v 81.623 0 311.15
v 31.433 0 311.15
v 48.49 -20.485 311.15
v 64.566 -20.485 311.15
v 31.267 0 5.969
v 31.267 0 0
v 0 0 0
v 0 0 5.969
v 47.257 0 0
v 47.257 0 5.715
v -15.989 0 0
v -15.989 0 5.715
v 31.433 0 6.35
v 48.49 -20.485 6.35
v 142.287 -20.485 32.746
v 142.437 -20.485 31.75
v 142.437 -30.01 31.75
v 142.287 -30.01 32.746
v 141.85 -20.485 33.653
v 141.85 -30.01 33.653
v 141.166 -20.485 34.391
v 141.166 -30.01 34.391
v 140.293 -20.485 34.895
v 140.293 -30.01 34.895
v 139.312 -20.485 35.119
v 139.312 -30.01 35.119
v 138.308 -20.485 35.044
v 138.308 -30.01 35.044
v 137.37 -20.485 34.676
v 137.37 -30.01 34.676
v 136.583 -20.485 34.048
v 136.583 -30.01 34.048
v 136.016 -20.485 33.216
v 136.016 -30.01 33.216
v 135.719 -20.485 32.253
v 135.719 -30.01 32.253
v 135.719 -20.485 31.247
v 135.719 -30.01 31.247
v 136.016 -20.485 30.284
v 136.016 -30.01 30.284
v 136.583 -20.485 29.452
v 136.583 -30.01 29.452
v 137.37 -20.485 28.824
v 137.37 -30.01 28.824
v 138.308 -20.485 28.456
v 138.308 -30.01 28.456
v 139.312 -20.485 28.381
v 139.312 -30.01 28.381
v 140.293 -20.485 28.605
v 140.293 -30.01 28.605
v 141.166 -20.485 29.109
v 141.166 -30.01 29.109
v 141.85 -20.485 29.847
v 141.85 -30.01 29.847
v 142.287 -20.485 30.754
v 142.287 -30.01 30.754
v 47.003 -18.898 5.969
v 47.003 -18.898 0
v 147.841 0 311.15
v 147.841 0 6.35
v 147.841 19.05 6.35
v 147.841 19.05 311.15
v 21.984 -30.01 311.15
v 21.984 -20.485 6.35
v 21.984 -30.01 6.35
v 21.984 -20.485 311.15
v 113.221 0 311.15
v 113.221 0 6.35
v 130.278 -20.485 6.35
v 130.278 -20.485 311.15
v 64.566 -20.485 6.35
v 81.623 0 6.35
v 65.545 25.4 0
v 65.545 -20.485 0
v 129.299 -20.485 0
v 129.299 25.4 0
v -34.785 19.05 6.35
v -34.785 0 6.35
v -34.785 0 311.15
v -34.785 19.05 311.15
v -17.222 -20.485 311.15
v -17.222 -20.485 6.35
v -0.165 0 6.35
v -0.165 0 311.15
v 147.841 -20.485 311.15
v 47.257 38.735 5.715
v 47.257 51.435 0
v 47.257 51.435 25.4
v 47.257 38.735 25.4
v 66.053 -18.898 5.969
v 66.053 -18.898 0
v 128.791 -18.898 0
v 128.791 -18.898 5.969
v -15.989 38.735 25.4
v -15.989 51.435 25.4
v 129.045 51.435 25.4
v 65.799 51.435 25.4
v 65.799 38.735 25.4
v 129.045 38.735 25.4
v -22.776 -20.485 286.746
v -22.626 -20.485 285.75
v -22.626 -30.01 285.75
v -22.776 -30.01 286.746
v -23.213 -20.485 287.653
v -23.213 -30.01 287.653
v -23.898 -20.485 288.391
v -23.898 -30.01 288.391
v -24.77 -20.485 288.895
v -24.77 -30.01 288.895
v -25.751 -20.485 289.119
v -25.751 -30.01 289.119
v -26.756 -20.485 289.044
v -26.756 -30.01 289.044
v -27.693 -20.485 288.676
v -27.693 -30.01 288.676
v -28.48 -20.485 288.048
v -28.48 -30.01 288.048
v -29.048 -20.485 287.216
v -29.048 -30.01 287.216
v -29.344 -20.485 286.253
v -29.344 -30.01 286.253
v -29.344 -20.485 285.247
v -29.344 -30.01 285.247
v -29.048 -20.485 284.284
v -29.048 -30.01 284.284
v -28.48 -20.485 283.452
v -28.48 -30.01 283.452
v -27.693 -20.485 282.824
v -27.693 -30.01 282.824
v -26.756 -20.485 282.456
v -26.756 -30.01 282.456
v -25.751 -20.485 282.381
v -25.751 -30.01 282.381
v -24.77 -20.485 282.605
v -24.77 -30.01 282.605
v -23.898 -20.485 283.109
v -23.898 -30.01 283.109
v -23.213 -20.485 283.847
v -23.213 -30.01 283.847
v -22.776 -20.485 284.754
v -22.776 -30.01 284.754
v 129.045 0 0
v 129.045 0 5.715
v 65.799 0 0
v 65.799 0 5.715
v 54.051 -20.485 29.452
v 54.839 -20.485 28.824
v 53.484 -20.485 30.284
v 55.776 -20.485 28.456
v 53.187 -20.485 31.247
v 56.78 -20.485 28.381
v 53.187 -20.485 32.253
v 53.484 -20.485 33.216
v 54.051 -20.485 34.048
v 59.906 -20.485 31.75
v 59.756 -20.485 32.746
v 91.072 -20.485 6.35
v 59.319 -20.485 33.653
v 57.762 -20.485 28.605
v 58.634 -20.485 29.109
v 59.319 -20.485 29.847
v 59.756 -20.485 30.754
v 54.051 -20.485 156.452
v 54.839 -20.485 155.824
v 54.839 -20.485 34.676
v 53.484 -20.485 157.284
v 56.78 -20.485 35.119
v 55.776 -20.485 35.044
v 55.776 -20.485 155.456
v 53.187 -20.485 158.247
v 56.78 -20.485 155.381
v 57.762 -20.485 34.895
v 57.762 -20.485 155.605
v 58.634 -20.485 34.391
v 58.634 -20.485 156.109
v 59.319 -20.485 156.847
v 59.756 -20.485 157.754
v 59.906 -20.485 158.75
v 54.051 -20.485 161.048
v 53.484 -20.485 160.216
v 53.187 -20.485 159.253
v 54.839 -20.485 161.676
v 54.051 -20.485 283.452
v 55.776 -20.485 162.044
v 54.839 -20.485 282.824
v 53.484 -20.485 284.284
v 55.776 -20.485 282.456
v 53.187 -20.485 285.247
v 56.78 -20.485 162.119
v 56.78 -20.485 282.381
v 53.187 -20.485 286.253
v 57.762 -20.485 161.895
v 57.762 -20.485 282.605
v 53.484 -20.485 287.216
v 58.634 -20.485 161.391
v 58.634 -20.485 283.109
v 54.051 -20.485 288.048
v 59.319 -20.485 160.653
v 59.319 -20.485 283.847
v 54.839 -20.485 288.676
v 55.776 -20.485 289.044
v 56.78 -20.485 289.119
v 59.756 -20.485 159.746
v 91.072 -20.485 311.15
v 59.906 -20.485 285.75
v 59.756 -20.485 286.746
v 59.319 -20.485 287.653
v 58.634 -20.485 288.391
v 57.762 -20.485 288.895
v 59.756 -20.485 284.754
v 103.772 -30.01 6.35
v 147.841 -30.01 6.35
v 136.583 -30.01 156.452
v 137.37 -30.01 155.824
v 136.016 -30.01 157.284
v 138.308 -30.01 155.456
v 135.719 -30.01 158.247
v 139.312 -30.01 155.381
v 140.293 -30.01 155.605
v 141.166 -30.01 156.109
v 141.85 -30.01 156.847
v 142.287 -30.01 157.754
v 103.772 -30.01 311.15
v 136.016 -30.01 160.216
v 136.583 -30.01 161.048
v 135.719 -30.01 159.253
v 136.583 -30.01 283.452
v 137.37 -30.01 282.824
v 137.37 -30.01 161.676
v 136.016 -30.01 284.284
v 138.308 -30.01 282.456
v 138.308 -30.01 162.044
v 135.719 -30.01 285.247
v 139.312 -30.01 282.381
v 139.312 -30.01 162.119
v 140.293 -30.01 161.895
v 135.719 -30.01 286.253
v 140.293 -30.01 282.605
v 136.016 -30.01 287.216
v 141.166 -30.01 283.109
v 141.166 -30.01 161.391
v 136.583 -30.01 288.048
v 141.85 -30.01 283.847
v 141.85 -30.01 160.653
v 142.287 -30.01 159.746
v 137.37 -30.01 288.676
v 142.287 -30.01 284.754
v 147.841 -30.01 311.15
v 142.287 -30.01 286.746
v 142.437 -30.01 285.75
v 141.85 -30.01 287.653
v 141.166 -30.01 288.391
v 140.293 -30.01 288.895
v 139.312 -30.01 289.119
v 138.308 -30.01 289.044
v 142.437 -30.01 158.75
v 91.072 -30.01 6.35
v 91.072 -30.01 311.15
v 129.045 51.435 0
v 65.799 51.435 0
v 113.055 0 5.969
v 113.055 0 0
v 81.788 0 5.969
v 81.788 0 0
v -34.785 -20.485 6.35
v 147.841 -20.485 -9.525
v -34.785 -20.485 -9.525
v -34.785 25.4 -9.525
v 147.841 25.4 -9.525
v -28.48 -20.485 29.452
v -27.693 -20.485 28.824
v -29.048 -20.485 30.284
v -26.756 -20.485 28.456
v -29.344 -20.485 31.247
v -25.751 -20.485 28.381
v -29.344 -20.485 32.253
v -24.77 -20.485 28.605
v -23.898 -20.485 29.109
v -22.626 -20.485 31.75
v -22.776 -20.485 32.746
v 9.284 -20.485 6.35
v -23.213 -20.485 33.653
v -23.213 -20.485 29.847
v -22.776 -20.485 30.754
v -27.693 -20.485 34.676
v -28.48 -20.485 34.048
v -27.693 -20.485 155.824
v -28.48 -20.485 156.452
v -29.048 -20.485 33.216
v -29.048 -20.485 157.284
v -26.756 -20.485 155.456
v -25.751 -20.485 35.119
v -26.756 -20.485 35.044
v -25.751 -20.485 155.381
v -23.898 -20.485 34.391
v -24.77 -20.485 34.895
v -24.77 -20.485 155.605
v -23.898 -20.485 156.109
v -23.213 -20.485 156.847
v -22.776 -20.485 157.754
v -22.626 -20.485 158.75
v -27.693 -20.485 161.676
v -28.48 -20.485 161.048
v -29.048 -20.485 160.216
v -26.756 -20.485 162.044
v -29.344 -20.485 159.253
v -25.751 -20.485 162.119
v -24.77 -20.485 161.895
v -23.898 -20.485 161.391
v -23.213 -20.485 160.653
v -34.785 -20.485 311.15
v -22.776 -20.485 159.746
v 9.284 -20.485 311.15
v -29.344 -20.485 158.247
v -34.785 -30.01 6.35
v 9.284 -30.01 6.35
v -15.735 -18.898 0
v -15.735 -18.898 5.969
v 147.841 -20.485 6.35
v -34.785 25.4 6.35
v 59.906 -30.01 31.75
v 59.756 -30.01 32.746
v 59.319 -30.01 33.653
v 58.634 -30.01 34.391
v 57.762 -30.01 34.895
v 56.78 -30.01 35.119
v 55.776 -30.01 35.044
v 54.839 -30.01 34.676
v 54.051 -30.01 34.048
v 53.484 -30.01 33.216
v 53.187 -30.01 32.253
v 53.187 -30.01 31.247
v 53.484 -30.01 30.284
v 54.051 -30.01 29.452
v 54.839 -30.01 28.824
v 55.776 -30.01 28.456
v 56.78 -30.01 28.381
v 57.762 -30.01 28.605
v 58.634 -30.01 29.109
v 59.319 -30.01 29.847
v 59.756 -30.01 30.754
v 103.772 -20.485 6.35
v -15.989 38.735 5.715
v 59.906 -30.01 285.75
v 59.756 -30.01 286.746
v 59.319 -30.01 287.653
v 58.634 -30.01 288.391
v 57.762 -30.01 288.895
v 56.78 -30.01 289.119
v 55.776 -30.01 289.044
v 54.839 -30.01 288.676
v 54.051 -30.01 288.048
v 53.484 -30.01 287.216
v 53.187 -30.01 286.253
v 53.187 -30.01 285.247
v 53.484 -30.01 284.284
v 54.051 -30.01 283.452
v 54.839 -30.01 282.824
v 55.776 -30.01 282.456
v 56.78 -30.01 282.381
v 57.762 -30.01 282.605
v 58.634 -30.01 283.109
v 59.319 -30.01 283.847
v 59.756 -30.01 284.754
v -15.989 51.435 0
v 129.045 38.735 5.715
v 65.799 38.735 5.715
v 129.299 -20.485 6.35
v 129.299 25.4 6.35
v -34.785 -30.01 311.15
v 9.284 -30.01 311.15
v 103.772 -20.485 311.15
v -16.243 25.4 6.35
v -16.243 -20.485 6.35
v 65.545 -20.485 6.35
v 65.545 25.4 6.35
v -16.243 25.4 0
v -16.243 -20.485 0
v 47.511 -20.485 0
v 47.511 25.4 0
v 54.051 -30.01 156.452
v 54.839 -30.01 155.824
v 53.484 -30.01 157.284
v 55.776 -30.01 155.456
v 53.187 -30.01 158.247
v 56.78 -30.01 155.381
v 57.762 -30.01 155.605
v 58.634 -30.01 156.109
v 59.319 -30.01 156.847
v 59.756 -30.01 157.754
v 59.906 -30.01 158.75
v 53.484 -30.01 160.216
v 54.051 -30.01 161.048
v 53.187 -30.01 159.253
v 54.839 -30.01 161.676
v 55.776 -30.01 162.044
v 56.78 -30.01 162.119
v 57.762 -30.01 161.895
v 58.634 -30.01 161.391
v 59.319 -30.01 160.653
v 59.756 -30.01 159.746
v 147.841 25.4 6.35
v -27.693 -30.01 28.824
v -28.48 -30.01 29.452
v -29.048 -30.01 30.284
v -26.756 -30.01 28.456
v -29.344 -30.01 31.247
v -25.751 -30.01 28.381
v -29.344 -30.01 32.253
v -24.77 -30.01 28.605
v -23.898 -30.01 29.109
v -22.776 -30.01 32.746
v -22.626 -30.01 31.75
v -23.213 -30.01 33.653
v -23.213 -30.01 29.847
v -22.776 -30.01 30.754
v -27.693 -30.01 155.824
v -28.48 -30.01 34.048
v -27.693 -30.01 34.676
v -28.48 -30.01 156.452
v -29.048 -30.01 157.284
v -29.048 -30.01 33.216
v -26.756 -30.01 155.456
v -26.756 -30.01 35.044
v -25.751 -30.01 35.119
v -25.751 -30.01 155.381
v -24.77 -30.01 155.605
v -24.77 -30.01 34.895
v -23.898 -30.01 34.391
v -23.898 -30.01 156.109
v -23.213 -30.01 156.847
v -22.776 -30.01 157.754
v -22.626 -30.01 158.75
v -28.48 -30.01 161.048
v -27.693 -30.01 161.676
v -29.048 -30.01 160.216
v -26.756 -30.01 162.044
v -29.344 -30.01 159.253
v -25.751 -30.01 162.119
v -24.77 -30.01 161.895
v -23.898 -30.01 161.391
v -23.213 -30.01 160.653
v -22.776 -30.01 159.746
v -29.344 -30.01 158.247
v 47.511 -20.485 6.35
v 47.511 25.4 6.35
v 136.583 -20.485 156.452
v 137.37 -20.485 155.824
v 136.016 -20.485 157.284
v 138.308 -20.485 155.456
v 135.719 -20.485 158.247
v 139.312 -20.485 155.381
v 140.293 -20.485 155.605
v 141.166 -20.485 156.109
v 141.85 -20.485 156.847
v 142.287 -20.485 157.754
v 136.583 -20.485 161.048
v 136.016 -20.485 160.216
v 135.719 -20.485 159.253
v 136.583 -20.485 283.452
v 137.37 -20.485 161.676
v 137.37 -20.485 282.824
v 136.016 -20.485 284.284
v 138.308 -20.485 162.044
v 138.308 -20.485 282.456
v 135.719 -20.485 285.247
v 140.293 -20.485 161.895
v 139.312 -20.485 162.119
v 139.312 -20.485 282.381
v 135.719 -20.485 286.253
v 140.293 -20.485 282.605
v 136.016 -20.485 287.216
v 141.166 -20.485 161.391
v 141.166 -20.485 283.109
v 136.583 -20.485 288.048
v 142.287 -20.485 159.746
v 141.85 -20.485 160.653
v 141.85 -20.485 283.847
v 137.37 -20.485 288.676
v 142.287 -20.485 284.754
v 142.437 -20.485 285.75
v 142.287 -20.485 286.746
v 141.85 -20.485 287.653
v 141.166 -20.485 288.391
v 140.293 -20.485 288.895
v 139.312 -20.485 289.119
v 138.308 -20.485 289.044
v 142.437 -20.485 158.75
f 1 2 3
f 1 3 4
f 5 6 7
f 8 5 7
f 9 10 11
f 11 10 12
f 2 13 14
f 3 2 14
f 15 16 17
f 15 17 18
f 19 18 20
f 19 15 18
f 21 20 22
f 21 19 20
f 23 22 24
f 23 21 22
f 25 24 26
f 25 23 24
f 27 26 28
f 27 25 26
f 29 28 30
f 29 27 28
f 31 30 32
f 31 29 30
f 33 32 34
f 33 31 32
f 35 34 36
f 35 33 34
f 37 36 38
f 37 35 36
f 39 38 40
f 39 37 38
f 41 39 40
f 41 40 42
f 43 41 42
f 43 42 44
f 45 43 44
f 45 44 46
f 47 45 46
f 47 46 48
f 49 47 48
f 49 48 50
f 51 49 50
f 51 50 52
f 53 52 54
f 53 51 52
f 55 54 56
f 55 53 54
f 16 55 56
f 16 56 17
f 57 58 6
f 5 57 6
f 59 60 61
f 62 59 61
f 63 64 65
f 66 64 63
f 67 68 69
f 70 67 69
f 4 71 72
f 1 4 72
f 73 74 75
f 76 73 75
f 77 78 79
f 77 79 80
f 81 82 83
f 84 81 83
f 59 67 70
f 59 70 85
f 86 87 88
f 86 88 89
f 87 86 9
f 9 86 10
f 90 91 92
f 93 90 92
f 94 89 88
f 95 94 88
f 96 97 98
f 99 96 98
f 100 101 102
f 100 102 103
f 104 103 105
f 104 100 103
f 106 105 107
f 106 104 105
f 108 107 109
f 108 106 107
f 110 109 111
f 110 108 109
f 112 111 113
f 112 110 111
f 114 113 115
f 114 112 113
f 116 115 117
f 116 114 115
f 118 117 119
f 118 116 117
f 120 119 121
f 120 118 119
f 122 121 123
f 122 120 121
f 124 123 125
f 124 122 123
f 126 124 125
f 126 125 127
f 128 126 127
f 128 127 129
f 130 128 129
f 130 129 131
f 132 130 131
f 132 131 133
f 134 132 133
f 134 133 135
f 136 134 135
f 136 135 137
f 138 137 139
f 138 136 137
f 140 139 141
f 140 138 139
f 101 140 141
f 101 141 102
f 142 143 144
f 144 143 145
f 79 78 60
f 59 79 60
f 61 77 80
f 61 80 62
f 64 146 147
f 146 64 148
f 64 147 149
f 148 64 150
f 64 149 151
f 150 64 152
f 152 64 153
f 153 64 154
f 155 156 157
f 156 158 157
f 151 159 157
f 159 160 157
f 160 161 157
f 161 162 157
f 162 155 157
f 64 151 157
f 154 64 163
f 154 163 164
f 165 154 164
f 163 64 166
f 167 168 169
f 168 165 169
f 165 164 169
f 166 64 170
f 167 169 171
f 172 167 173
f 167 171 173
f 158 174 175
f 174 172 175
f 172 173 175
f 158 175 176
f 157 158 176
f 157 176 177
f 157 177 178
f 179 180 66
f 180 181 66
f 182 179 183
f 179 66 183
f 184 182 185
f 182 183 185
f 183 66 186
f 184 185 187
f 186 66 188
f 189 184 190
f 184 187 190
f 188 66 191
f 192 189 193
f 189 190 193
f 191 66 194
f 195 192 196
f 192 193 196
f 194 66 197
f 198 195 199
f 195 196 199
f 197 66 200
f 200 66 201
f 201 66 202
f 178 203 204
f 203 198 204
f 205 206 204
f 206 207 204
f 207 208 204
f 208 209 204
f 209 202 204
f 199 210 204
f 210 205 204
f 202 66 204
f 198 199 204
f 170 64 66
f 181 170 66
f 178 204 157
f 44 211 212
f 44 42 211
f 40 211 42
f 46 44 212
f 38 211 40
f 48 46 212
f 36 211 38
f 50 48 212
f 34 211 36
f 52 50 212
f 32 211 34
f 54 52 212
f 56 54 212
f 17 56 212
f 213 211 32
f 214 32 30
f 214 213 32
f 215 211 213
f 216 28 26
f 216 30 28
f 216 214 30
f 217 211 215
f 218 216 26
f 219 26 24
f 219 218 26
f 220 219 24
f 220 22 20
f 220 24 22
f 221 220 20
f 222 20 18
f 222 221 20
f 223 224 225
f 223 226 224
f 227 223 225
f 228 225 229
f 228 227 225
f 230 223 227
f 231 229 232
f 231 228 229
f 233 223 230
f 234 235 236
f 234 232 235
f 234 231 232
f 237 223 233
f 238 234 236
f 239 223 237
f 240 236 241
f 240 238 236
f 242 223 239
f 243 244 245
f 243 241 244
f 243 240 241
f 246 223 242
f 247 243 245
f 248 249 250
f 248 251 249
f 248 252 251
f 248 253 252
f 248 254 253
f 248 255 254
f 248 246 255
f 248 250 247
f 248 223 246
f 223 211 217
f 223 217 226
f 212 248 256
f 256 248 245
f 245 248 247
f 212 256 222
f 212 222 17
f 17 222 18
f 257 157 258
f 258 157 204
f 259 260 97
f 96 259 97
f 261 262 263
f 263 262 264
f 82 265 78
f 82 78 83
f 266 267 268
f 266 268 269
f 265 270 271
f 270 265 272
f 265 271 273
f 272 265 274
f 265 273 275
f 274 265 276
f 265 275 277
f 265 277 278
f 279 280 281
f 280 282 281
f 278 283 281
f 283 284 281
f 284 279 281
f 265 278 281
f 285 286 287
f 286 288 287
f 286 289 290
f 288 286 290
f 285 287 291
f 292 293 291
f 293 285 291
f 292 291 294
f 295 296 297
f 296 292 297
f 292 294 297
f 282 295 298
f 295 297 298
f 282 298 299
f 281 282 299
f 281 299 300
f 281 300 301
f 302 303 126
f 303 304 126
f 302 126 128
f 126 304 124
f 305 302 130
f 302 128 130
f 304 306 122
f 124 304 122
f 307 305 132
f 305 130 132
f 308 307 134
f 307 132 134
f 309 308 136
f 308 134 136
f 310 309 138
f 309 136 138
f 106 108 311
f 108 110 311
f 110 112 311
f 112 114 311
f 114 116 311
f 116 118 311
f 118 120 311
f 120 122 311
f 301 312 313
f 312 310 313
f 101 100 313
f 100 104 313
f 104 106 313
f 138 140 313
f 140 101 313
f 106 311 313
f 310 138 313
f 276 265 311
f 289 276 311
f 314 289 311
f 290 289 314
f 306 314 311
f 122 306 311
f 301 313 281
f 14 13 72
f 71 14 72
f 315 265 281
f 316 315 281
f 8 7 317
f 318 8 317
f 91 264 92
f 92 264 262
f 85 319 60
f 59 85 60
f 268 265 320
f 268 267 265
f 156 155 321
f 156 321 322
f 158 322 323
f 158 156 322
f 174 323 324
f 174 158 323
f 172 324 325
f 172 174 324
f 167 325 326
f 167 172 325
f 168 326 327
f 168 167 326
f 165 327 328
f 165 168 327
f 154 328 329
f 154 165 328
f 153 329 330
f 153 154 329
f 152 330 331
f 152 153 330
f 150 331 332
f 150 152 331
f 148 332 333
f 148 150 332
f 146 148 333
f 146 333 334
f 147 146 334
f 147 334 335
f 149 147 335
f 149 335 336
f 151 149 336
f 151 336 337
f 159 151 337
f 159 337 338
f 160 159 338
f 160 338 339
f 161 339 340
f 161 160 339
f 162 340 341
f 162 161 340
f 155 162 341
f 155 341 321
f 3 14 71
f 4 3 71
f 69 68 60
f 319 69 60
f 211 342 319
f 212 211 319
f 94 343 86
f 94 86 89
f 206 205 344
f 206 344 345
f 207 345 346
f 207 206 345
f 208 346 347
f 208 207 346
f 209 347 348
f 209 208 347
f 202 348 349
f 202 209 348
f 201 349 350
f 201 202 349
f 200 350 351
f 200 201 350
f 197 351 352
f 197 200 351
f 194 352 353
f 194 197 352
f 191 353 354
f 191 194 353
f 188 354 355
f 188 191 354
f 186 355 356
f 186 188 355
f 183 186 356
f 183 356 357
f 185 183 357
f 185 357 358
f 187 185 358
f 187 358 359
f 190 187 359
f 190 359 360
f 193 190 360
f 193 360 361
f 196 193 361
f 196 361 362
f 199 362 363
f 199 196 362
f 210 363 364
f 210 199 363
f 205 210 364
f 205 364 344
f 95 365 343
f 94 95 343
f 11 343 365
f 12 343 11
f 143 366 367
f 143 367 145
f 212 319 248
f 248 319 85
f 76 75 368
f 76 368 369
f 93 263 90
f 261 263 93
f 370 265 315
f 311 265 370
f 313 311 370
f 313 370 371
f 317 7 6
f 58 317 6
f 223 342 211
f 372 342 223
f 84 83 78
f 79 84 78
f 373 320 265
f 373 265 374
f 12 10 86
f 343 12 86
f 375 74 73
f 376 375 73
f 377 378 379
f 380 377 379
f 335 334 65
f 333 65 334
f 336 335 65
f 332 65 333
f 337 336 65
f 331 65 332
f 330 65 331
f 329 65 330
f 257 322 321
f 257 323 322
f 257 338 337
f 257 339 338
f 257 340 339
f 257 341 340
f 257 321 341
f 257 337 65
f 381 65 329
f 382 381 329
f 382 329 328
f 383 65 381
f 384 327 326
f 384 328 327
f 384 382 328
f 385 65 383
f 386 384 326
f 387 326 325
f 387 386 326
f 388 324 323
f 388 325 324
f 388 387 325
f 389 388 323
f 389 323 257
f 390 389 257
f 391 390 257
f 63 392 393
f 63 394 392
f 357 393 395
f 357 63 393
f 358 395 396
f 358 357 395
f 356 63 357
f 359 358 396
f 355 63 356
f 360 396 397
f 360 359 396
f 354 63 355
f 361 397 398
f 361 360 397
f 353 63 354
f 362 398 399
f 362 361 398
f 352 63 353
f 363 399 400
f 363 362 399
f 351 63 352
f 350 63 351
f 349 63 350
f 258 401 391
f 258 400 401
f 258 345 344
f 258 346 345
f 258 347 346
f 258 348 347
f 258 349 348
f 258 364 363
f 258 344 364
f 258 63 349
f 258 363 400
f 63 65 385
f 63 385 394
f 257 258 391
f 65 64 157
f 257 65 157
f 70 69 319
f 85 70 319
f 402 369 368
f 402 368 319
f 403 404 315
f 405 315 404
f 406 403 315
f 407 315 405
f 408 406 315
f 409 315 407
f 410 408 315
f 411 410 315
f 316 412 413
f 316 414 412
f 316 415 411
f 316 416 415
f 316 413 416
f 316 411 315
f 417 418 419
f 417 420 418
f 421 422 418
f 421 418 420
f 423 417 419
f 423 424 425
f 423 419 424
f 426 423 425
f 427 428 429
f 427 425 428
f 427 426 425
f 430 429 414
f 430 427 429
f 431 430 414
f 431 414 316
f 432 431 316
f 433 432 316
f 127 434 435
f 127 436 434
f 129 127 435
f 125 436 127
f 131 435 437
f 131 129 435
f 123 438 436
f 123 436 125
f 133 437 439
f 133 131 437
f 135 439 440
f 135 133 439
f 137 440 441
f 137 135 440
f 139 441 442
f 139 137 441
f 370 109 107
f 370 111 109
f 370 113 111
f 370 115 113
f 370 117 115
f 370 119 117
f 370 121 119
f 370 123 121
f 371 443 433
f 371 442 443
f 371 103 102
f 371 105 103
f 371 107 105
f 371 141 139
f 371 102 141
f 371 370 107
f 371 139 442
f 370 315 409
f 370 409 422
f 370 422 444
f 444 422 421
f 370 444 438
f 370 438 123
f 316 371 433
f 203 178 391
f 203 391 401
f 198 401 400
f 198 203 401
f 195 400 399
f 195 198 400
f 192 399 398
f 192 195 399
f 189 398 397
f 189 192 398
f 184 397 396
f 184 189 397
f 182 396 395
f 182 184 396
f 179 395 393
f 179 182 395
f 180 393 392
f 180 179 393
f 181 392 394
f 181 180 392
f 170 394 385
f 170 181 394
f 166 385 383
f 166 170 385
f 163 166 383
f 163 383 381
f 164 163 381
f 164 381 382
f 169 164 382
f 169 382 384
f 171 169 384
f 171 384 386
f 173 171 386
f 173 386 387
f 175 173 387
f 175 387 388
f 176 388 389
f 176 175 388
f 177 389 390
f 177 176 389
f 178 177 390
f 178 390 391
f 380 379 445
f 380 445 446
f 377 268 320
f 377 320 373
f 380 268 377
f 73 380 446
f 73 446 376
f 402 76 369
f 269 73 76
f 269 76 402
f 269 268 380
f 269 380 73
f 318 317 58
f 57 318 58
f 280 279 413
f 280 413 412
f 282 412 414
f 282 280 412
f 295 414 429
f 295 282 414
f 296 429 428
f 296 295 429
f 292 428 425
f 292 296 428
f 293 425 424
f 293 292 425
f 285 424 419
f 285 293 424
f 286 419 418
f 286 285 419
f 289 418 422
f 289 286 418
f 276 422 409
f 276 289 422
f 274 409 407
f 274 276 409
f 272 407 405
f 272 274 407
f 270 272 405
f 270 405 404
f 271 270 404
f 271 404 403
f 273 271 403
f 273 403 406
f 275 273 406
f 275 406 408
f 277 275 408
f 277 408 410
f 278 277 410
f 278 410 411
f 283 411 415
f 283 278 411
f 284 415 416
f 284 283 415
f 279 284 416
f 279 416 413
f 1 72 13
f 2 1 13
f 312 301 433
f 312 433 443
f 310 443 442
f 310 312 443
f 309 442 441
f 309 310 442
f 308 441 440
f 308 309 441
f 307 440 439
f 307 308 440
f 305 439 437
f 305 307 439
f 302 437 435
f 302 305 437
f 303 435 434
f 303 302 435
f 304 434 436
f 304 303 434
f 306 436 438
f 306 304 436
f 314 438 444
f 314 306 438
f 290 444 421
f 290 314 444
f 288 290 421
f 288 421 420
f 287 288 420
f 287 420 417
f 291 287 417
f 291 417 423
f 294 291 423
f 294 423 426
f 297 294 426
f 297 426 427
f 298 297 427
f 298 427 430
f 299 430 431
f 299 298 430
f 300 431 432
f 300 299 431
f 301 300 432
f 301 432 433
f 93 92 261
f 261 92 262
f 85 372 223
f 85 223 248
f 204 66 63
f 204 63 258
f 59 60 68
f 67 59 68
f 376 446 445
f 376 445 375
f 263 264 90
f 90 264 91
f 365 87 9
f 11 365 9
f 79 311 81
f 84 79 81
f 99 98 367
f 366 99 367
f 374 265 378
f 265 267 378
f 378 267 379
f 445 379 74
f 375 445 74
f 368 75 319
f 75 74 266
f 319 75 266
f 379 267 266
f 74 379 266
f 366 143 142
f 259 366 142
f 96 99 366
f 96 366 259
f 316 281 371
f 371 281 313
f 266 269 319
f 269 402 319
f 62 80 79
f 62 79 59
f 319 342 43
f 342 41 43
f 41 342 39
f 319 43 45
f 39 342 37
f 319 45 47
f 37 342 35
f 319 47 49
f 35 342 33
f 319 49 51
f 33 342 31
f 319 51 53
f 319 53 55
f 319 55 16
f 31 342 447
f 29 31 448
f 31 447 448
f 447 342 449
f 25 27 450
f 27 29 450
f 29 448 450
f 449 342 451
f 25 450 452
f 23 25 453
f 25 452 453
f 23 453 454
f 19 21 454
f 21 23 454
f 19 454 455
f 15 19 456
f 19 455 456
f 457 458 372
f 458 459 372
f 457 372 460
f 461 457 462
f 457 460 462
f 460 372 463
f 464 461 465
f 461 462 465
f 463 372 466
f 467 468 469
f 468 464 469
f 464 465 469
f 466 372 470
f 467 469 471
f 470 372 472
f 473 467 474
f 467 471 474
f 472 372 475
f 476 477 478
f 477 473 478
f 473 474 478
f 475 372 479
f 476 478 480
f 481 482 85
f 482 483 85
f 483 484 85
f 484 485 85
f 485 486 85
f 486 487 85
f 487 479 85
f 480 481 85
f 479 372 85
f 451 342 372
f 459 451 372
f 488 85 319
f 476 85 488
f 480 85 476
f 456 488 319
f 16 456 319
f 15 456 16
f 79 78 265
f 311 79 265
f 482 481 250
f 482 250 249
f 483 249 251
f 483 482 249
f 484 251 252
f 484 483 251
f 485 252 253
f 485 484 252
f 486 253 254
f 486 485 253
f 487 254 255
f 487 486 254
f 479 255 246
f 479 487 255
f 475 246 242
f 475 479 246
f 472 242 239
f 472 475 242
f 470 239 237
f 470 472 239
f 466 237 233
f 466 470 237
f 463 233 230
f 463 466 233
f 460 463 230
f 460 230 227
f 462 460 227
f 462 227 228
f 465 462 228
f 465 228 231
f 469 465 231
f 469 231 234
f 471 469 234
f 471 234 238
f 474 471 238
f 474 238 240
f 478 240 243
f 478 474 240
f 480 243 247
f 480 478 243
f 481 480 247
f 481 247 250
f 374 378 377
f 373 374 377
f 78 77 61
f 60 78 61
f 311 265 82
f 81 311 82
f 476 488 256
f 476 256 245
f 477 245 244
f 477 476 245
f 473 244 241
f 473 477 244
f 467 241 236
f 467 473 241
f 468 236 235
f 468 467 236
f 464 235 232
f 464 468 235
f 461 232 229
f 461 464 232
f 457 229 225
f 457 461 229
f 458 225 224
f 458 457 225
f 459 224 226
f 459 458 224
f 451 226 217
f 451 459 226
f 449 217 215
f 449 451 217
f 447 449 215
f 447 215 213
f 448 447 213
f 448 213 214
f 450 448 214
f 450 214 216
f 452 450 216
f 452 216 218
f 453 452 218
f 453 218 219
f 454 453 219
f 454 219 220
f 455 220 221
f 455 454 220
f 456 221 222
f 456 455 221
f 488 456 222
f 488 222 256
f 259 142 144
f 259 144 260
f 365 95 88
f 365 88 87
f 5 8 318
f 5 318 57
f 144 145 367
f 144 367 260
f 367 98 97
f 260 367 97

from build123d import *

# Parameters (mm, degrees)
F1_DEPTH  = 5.969
F2_W      = 182.626
F2_H      = 45.8851
F3_DEPTH  = 9.525
F4_W      = 47.2567
F4_H      = 5.715
F4_W_2    = 15.9893
F5_DEPTH  = 25.4
F4_W_3    = 63.246
F6_W      = 18.542
F6_H      = 45.8851
F6_W_2    = 18.034
F7_DEPTH  = 6.35
F8_W      = 182.626
F8_H      = 19.05
F9_DEPTH  = 304.8
F11_DEPTH = 63.246
F13_DEPTH = 63.246
F15_DEPTH = 304.8
F16_W     = 44.069
F16_H     = 304.8
F16_R     = 3.3782
F17_DEPTH = 9.525
F16_W_2   = 69.088


with BuildPart() as f1:
    # F0 (on Top) → F1 (new body)
    with BuildSketch(Plane.XY):
        Polygon((0, 0), (-15.7353, -18.8976), (47.0027, -18.8976), (31.2674, 0), align=None)
    extrude(amount=F1_DEPTH)


with BuildPart() as f1b:
    # F0 (on Top) → F1, piece 2 (new body)
    with BuildSketch(Plane.XY):
        Polygon((81.788, 0), (66.0527, -18.8976), (128.7907, -18.8976), (113.0554, 0), align=None)
    extrude(amount=F1_DEPTH)


with BuildPart() as f3:
    # F2 (on face) → F3 (new body)
    with BuildSketch(Plane(origin=(0, 0, 0), x_dir=(1, 0, 0), z_dir=(0, 0, -1))):
        with Locations((56.5277, -2.45745)):
            Rectangle(F2_W, F2_H)
    extrude(amount=F3_DEPTH)

    # F6 (on face) → F7 (join)
    with BuildSketch(Plane.XY):
        with Locations((-25.5143, 2.45745)):
            Rectangle(F6_W, F6_H)
        with Locations((138.5697, 2.45745)):
            Rectangle(F6_W, F6_H)
        with Locations((56.5277, 2.45745)):
            Rectangle(F6_W_2, F6_H)
    extrude(amount=F7_DEPTH)


with BuildPart() as f5:
    # F4 (on face) → F5 (new body)
    with BuildSketch(Plane(origin=(0, 0, 0), x_dir=(-1, 0, 0), z_dir=(0, 1, 0))):
        with Locations((-7.63905, 2.8575)):
            Rectangle(F4_W, F4_H)
        with Locations((-39.26205, 2.8575)):
            Rectangle(F4_W_2, F4_H)
    extrude(amount=F5_DEPTH)

    # F10 (on face) → F11 (join, through all)
    with BuildSketch(Plane(origin=(-15.9893, 0, 0), x_dir=(0, -1, 0), z_dir=(-1, 0, 0))):
        Polygon((-38.735, 25.4), (-51.435, 25.4), (-51.435, 0), (-38.735, 0), (-25.4, 0), (-25.4, 5.715), (-38.735, 5.715), align=None)
    extrude(amount=-F11_DEPTH)


with BuildPart() as f5b:
    # F4 (on face) → F5, piece 2 (new body)
    with BuildSketch(Plane(origin=(0, 0, 0), x_dir=(-1, 0, 0), z_dir=(0, 1, 0))):
        with Locations((-97.4217, 2.8575)):
            Rectangle(F4_W_3, F4_H)
    extrude(amount=F5_DEPTH)

    # F12 (on face) → F13 (join, through all)
    with BuildSketch(Plane.YZ.offset(129.0447)):
        Polygon((38.735, 25.4), (38.735, 5.715), (25.4, 5.715), (25.4, 0), (38.735, 0), (51.435, 0), (51.435, 25.4), align=None)
    extrude(amount=-F13_DEPTH)


with BuildPart() as f9:
    # F8 (on face) → F9 (new body)
    with BuildSketch(Plane.XY.offset(6.35)):
        with Locations((56.5277, 9.525)):
            Rectangle(F8_W, F8_H)
    extrude(amount=F9_DEPTH)


with BuildPart() as f15:
    # F14 (on face) → F15 (new body)
    with BuildSketch(Plane.XY.offset(6.35)):
        Polygon((-0.1652623251, 0), (-34.7853, 0), (-34.7853, -20.4851), (-17.2224121235, -20.4851), align=None)
    extrude(amount=F15_DEPTH)


with BuildPart() as f15b:
    # F14 (on face) → F15, piece 2 (new body)
    with BuildSketch(Plane.XY.offset(6.35)):
        Polygon((56.5277, 0), (31.4326623251, 0), (48.4898121235, -20.4851), (56.5277, -20.4851), (64.5655878765, -20.4851), (81.6227376749, 0), align=None)
    extrude(amount=F15_DEPTH)


with BuildPart() as f15c:
    # F14 (on face) → F15, piece 3 (new body)
    with BuildSketch(Plane.XY.offset(6.35)):
        Polygon((113.2206623251, 0), (130.2778121235, -20.4851), (147.8407, -20.4851), (147.8407, 0), align=None)
    extrude(amount=F15_DEPTH)


with BuildPart() as f17:
    # F16 (on face) → F17 (new body)
    with BuildSketch(Plane.XZ.offset(20.4851)):
        with Locations((-12.7508, 158.75)):
            Rectangle(F16_W, F16_H)
        with Locations((-26.0038560617, 31.75)):
            Circle(F16_R, mode=Mode.SUBTRACT)
        with Locations((-26.0038560617, 158.75)):
            Circle(F16_R, mode=Mode.SUBTRACT)
        with Locations((-26.0038560617, 285.75)):
            Circle(F16_R, mode=Mode.SUBTRACT)
    extrude(amount=F17_DEPTH)


with BuildPart() as f17b:
    # F16 (on face) → F17, piece 2 (new body)
    with BuildSketch(Plane.XZ.offset(20.4851)):
        with Locations((56.5277, 158.75)):
            Rectangle(F16_W_2, F16_H)
        with Locations((56.5277, 31.75)):
            Circle(F16_R, mode=Mode.SUBTRACT)
        with Locations((56.5277, 158.75)):
            Circle(F16_R, mode=Mode.SUBTRACT)
        with Locations((56.5277, 285.75)):
            Circle(F16_R, mode=Mode.SUBTRACT)
    extrude(amount=F17_DEPTH)


with BuildPart() as f17c:
    # F16 (on face) → F17, piece 3 (new body)
    with BuildSketch(Plane.XZ.offset(20.4851)):
        with Locations((125.8062, 158.75)):
            Rectangle(F16_W, F16_H)
        with Locations((139.0592560617, 31.75)):
            Circle(F16_R, mode=Mode.SUBTRACT)
        with Locations((139.0592560617, 158.75)):
            Circle(F16_R, mode=Mode.SUBTRACT)
        with Locations((139.0592560617, 285.75)):
            Circle(F16_R, mode=Mode.SUBTRACT)
    extrude(amount=F17_DEPTH)


solid = Compound([f1.part, f1b.part, f3.part, f5.part, f5b.part, f9.part, f15.part, f15b.part, f15c.part, f17.part, f17b.part, f17c.part])
